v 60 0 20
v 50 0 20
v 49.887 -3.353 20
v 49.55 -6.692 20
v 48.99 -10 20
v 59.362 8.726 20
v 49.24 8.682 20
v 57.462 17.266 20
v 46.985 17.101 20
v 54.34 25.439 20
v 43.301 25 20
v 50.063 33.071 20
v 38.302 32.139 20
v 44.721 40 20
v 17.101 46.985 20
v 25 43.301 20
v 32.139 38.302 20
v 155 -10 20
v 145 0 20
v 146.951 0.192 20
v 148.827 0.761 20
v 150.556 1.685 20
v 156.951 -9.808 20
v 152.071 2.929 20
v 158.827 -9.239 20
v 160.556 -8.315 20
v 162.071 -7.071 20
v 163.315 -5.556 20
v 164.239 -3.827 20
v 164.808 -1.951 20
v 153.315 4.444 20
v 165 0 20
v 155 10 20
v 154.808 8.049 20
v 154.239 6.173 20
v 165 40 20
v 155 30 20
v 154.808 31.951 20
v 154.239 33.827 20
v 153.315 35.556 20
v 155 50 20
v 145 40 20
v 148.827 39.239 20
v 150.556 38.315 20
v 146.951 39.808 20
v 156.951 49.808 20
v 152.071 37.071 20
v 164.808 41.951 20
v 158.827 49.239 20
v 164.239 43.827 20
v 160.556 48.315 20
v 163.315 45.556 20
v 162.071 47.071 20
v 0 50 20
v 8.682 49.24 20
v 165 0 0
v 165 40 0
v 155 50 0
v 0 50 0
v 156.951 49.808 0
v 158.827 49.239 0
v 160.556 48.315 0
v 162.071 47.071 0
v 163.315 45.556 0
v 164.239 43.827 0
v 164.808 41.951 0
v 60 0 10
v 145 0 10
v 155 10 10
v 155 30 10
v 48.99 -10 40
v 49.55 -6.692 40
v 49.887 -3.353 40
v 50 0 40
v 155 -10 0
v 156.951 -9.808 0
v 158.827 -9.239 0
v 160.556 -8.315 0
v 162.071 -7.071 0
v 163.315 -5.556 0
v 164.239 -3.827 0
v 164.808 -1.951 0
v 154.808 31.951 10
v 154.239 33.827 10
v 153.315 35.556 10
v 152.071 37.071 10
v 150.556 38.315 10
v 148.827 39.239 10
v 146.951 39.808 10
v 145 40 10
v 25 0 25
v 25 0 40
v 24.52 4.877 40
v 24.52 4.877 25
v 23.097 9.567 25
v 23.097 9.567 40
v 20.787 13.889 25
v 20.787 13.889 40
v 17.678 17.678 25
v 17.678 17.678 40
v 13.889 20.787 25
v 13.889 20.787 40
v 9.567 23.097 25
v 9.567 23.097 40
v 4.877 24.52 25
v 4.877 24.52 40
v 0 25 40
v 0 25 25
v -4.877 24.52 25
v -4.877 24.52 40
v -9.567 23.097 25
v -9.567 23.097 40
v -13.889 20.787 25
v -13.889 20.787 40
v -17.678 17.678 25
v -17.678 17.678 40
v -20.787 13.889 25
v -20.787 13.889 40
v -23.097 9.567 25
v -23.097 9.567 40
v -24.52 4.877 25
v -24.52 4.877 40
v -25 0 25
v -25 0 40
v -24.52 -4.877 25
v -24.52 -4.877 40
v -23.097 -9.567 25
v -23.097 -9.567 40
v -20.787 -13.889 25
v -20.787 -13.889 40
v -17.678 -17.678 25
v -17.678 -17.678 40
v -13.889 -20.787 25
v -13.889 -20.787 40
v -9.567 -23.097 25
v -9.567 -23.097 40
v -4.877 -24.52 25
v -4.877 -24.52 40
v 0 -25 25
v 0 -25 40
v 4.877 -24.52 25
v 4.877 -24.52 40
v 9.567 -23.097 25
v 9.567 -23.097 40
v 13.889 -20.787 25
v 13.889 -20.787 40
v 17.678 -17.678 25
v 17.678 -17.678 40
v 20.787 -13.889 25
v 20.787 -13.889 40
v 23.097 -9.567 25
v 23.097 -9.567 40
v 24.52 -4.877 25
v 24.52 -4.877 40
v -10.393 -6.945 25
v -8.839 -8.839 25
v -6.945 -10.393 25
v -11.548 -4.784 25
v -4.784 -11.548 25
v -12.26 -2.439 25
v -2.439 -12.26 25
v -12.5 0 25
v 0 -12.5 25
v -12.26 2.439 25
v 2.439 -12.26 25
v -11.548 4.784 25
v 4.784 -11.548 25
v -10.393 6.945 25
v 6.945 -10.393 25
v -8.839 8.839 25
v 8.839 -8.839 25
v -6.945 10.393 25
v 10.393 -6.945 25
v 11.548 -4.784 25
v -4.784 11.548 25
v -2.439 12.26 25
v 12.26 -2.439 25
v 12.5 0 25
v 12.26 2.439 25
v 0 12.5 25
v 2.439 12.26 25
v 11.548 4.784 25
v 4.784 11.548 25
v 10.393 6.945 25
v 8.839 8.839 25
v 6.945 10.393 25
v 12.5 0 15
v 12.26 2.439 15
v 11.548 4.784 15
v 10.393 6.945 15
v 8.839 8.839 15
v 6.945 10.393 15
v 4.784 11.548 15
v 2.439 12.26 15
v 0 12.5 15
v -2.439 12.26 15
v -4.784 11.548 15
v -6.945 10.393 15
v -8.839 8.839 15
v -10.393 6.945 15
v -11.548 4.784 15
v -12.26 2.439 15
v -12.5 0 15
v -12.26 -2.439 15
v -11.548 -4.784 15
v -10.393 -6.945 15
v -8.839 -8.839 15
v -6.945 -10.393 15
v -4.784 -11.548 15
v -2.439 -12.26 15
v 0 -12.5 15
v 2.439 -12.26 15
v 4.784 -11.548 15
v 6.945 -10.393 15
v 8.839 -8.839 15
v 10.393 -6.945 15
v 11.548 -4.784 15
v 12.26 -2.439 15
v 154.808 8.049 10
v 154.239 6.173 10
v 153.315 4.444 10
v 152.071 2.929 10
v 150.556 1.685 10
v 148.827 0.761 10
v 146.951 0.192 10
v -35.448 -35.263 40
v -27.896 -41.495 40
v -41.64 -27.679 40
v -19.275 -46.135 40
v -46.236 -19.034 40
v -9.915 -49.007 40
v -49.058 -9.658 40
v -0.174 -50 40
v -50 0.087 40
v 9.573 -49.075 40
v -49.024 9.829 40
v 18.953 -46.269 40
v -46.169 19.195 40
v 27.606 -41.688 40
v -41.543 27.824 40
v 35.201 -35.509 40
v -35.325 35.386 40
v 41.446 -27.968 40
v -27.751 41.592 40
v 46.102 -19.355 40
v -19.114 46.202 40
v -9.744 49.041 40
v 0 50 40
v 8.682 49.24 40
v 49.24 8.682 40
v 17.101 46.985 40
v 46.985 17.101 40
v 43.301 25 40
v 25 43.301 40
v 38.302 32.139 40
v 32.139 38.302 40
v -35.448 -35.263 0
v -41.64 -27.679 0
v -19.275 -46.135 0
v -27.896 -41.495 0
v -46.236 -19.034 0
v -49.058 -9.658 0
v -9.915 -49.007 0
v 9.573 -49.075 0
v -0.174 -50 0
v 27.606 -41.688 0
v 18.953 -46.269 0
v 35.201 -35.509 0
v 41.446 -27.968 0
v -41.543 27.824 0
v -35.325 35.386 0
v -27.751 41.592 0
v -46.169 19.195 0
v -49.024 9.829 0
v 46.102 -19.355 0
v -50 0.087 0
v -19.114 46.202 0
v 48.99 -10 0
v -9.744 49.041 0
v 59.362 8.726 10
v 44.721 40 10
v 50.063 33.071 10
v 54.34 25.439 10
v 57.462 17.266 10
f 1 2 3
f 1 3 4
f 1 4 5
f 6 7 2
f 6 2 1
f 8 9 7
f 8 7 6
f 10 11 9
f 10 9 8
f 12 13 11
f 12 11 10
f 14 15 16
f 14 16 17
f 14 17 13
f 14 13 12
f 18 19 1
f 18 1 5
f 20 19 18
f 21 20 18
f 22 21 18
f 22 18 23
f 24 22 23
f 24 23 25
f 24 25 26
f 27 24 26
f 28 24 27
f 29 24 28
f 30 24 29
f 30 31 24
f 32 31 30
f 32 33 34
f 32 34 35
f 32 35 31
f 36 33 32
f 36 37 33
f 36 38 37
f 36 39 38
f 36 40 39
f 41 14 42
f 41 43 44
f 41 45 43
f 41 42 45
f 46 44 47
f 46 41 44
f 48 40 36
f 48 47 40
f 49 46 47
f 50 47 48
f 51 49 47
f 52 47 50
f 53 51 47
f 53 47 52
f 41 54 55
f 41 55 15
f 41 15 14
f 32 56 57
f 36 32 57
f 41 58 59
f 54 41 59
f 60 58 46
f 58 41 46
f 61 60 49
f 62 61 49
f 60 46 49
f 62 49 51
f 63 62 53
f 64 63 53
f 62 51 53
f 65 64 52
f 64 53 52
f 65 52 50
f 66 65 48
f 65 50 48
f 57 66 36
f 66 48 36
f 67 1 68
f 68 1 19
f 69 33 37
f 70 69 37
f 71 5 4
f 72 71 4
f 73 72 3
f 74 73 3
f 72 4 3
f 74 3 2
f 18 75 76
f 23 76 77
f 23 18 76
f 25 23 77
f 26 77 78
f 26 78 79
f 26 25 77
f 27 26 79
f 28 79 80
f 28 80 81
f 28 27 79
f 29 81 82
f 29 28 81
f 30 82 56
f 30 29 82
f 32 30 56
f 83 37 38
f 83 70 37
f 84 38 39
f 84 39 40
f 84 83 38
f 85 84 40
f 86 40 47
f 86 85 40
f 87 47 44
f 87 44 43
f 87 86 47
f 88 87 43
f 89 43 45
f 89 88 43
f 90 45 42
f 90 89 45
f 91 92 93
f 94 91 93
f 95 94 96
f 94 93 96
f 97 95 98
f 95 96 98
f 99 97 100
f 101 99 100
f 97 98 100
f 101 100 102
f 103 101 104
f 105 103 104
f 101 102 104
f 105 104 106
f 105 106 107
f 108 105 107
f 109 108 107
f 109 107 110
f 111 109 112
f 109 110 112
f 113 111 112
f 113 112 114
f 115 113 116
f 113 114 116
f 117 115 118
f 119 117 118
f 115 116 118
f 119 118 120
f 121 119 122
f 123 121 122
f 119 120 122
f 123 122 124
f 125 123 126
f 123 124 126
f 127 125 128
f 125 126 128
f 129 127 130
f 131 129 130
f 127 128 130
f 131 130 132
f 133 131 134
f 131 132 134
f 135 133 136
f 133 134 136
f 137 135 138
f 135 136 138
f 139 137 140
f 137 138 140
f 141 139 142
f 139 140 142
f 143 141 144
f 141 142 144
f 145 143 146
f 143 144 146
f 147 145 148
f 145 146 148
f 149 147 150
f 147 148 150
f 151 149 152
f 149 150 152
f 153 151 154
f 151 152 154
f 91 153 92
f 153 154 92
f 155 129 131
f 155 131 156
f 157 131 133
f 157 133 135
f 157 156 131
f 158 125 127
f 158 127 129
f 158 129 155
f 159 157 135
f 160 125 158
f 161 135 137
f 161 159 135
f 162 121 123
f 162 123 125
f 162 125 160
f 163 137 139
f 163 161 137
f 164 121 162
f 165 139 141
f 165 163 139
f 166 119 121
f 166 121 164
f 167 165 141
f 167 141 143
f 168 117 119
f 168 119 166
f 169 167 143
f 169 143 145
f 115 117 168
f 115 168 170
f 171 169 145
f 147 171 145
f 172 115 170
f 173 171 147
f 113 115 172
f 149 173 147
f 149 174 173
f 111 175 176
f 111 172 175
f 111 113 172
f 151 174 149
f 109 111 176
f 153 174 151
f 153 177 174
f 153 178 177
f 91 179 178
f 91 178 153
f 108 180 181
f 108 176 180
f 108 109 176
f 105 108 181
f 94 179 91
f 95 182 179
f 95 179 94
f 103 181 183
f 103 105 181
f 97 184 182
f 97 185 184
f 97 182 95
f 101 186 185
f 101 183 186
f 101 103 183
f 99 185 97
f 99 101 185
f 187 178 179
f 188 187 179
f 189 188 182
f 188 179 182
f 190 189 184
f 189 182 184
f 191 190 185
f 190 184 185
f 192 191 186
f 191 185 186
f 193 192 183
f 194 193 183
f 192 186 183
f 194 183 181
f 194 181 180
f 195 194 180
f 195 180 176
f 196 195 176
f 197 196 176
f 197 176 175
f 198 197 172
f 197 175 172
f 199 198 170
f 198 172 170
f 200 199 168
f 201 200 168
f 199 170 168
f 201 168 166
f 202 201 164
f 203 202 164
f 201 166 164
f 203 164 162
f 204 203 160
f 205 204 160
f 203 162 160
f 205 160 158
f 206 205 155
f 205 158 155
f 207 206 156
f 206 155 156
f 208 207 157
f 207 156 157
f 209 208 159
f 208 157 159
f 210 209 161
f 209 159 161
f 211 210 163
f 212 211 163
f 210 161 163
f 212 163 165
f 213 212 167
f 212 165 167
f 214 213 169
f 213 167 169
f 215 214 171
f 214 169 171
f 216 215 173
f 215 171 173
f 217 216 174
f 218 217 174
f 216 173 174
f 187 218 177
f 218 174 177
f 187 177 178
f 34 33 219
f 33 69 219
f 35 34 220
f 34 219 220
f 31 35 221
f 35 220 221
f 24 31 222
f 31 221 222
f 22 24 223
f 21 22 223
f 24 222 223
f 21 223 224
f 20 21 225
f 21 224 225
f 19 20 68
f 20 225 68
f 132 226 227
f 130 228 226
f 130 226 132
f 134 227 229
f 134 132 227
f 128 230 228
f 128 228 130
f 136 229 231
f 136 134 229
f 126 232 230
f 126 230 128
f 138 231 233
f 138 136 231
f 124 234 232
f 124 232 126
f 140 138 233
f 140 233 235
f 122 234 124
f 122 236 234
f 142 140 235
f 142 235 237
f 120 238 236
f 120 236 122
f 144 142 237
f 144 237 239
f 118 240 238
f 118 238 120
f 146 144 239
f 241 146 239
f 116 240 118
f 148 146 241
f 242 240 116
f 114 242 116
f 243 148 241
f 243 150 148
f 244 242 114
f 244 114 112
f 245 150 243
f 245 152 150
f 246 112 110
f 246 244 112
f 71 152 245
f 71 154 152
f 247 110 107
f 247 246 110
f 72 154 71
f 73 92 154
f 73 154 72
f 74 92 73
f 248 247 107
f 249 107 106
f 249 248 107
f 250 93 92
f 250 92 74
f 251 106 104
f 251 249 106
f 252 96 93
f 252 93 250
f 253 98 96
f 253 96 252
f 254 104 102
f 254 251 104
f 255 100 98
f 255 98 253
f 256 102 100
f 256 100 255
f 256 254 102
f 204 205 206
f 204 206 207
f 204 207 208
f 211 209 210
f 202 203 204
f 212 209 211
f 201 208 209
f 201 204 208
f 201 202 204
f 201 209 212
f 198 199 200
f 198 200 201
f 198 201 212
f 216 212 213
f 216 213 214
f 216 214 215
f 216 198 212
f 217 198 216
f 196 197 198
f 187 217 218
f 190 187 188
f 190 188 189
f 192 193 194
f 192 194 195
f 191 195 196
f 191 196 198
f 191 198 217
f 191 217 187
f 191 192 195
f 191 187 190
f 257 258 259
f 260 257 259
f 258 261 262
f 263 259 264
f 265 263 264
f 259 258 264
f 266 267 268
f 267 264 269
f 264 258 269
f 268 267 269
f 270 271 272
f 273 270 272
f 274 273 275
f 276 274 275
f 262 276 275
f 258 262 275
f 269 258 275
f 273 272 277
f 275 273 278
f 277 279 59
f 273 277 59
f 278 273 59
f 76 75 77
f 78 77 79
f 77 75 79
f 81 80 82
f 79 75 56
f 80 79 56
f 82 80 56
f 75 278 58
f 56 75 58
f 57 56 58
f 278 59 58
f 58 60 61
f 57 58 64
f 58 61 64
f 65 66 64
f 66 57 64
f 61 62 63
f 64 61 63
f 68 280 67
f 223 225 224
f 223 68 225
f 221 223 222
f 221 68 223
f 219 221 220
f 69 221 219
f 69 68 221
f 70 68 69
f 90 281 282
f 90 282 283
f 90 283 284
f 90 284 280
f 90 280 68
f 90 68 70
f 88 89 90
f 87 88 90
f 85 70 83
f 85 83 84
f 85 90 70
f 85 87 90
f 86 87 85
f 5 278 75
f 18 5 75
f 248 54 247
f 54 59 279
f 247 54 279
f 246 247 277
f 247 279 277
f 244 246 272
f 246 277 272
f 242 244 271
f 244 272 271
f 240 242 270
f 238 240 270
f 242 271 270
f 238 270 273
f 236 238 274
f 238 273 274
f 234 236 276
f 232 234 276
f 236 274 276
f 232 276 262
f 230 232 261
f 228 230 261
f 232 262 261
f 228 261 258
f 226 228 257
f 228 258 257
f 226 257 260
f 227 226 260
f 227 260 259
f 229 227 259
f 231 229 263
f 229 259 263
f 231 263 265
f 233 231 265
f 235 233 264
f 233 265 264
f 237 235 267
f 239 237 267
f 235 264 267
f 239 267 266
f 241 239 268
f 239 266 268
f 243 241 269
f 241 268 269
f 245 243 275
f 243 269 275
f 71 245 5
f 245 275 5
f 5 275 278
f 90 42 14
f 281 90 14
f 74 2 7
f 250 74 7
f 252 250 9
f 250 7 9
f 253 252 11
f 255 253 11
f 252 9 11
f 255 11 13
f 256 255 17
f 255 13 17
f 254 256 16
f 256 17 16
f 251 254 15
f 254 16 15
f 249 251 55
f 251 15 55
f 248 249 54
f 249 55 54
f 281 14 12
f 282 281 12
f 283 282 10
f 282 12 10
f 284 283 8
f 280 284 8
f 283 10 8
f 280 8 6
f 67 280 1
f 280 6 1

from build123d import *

# Parameters (mm, degrees)
F1_DEPTH = 20
F2_DEPTH = 40
F3_R     = 25
F4_DEPTH = 15
F5_R     = 12.5
F6_DEPTH = 10
F8_DEPTH = 10
F9_R     = 10


with BuildPart() as f1:
    # F0 (on Top) → F1 (new body)
    with BuildSketch(Plane.XY):
        with BuildLine():
            ThreePointArc((0, 50), (35.355339, 35.355339), (50, 0))
            ThreePointArc((50, 0), (49.746808, -5.025448), (48.989795, -10))
            Line((48.989795, -10), (165, -10))
            Line((165, -10), (165, 50))
            Line((165, 50), (0, 50))
        make_face()
    extrude(amount=F1_DEPTH)

    # F0 (on Top) → F2 (join)
    with BuildSketch(Plane.XY):
        with BuildLine():
            Line((0, -10), (0, 50))
            ThreePointArc((0, 50), (-38.729833, -31.622777), (48.989795, -10))
            Line((48.989795, -10), (0, -10))
        make_face()
        with BuildLine():
            ThreePointArc((48.989795, -10), (49.746808, -5.025448), (50, 0))
            ThreePointArc((50, 0), (35.355339, 35.355339), (0, 50))
            Line((0, 50), (0, -10))
            Line((0, -10), (48.989795, -10))
        make_face()
    extrude(amount=F2_DEPTH)

    # F3 (on face) → F4 (cut)
    with BuildSketch(Plane.XY.offset(40)):
        Circle(F3_R)
    extrude(amount=-F4_DEPTH, mode=Mode.SUBTRACT)

    # F5 (on face) → F6 (cut)
    with BuildSketch(Plane.XY.offset(25)):
        Circle(F5_R)
    extrude(amount=-F6_DEPTH, mode=Mode.SUBTRACT)

    # F7 (on face) → F8 (cut)
    with BuildSketch(Plane.XY.offset(20)):
        with BuildLine():
            Line((155, 0), (155, 40))
            Line((155, 40), (44.72136, 40))
            ThreePointArc((44.72136, 40), (56.050342, 21.409325), (60, 0))
            Line((60, 0), (155, 0))
        make_face()
    extrude(amount=-F8_DEPTH, mode=Mode.SUBTRACT)

    # F9
    f9_edges = [f1.edges().sort_by_distance(p)[0] for p in [
        (165, 50, 10),
        (165, -10, 10),
        (155, 40, 15),
        (155, 0, 15),
    ]]
    fillet(f9_edges, radius=F9_R)


solid = f1.part
